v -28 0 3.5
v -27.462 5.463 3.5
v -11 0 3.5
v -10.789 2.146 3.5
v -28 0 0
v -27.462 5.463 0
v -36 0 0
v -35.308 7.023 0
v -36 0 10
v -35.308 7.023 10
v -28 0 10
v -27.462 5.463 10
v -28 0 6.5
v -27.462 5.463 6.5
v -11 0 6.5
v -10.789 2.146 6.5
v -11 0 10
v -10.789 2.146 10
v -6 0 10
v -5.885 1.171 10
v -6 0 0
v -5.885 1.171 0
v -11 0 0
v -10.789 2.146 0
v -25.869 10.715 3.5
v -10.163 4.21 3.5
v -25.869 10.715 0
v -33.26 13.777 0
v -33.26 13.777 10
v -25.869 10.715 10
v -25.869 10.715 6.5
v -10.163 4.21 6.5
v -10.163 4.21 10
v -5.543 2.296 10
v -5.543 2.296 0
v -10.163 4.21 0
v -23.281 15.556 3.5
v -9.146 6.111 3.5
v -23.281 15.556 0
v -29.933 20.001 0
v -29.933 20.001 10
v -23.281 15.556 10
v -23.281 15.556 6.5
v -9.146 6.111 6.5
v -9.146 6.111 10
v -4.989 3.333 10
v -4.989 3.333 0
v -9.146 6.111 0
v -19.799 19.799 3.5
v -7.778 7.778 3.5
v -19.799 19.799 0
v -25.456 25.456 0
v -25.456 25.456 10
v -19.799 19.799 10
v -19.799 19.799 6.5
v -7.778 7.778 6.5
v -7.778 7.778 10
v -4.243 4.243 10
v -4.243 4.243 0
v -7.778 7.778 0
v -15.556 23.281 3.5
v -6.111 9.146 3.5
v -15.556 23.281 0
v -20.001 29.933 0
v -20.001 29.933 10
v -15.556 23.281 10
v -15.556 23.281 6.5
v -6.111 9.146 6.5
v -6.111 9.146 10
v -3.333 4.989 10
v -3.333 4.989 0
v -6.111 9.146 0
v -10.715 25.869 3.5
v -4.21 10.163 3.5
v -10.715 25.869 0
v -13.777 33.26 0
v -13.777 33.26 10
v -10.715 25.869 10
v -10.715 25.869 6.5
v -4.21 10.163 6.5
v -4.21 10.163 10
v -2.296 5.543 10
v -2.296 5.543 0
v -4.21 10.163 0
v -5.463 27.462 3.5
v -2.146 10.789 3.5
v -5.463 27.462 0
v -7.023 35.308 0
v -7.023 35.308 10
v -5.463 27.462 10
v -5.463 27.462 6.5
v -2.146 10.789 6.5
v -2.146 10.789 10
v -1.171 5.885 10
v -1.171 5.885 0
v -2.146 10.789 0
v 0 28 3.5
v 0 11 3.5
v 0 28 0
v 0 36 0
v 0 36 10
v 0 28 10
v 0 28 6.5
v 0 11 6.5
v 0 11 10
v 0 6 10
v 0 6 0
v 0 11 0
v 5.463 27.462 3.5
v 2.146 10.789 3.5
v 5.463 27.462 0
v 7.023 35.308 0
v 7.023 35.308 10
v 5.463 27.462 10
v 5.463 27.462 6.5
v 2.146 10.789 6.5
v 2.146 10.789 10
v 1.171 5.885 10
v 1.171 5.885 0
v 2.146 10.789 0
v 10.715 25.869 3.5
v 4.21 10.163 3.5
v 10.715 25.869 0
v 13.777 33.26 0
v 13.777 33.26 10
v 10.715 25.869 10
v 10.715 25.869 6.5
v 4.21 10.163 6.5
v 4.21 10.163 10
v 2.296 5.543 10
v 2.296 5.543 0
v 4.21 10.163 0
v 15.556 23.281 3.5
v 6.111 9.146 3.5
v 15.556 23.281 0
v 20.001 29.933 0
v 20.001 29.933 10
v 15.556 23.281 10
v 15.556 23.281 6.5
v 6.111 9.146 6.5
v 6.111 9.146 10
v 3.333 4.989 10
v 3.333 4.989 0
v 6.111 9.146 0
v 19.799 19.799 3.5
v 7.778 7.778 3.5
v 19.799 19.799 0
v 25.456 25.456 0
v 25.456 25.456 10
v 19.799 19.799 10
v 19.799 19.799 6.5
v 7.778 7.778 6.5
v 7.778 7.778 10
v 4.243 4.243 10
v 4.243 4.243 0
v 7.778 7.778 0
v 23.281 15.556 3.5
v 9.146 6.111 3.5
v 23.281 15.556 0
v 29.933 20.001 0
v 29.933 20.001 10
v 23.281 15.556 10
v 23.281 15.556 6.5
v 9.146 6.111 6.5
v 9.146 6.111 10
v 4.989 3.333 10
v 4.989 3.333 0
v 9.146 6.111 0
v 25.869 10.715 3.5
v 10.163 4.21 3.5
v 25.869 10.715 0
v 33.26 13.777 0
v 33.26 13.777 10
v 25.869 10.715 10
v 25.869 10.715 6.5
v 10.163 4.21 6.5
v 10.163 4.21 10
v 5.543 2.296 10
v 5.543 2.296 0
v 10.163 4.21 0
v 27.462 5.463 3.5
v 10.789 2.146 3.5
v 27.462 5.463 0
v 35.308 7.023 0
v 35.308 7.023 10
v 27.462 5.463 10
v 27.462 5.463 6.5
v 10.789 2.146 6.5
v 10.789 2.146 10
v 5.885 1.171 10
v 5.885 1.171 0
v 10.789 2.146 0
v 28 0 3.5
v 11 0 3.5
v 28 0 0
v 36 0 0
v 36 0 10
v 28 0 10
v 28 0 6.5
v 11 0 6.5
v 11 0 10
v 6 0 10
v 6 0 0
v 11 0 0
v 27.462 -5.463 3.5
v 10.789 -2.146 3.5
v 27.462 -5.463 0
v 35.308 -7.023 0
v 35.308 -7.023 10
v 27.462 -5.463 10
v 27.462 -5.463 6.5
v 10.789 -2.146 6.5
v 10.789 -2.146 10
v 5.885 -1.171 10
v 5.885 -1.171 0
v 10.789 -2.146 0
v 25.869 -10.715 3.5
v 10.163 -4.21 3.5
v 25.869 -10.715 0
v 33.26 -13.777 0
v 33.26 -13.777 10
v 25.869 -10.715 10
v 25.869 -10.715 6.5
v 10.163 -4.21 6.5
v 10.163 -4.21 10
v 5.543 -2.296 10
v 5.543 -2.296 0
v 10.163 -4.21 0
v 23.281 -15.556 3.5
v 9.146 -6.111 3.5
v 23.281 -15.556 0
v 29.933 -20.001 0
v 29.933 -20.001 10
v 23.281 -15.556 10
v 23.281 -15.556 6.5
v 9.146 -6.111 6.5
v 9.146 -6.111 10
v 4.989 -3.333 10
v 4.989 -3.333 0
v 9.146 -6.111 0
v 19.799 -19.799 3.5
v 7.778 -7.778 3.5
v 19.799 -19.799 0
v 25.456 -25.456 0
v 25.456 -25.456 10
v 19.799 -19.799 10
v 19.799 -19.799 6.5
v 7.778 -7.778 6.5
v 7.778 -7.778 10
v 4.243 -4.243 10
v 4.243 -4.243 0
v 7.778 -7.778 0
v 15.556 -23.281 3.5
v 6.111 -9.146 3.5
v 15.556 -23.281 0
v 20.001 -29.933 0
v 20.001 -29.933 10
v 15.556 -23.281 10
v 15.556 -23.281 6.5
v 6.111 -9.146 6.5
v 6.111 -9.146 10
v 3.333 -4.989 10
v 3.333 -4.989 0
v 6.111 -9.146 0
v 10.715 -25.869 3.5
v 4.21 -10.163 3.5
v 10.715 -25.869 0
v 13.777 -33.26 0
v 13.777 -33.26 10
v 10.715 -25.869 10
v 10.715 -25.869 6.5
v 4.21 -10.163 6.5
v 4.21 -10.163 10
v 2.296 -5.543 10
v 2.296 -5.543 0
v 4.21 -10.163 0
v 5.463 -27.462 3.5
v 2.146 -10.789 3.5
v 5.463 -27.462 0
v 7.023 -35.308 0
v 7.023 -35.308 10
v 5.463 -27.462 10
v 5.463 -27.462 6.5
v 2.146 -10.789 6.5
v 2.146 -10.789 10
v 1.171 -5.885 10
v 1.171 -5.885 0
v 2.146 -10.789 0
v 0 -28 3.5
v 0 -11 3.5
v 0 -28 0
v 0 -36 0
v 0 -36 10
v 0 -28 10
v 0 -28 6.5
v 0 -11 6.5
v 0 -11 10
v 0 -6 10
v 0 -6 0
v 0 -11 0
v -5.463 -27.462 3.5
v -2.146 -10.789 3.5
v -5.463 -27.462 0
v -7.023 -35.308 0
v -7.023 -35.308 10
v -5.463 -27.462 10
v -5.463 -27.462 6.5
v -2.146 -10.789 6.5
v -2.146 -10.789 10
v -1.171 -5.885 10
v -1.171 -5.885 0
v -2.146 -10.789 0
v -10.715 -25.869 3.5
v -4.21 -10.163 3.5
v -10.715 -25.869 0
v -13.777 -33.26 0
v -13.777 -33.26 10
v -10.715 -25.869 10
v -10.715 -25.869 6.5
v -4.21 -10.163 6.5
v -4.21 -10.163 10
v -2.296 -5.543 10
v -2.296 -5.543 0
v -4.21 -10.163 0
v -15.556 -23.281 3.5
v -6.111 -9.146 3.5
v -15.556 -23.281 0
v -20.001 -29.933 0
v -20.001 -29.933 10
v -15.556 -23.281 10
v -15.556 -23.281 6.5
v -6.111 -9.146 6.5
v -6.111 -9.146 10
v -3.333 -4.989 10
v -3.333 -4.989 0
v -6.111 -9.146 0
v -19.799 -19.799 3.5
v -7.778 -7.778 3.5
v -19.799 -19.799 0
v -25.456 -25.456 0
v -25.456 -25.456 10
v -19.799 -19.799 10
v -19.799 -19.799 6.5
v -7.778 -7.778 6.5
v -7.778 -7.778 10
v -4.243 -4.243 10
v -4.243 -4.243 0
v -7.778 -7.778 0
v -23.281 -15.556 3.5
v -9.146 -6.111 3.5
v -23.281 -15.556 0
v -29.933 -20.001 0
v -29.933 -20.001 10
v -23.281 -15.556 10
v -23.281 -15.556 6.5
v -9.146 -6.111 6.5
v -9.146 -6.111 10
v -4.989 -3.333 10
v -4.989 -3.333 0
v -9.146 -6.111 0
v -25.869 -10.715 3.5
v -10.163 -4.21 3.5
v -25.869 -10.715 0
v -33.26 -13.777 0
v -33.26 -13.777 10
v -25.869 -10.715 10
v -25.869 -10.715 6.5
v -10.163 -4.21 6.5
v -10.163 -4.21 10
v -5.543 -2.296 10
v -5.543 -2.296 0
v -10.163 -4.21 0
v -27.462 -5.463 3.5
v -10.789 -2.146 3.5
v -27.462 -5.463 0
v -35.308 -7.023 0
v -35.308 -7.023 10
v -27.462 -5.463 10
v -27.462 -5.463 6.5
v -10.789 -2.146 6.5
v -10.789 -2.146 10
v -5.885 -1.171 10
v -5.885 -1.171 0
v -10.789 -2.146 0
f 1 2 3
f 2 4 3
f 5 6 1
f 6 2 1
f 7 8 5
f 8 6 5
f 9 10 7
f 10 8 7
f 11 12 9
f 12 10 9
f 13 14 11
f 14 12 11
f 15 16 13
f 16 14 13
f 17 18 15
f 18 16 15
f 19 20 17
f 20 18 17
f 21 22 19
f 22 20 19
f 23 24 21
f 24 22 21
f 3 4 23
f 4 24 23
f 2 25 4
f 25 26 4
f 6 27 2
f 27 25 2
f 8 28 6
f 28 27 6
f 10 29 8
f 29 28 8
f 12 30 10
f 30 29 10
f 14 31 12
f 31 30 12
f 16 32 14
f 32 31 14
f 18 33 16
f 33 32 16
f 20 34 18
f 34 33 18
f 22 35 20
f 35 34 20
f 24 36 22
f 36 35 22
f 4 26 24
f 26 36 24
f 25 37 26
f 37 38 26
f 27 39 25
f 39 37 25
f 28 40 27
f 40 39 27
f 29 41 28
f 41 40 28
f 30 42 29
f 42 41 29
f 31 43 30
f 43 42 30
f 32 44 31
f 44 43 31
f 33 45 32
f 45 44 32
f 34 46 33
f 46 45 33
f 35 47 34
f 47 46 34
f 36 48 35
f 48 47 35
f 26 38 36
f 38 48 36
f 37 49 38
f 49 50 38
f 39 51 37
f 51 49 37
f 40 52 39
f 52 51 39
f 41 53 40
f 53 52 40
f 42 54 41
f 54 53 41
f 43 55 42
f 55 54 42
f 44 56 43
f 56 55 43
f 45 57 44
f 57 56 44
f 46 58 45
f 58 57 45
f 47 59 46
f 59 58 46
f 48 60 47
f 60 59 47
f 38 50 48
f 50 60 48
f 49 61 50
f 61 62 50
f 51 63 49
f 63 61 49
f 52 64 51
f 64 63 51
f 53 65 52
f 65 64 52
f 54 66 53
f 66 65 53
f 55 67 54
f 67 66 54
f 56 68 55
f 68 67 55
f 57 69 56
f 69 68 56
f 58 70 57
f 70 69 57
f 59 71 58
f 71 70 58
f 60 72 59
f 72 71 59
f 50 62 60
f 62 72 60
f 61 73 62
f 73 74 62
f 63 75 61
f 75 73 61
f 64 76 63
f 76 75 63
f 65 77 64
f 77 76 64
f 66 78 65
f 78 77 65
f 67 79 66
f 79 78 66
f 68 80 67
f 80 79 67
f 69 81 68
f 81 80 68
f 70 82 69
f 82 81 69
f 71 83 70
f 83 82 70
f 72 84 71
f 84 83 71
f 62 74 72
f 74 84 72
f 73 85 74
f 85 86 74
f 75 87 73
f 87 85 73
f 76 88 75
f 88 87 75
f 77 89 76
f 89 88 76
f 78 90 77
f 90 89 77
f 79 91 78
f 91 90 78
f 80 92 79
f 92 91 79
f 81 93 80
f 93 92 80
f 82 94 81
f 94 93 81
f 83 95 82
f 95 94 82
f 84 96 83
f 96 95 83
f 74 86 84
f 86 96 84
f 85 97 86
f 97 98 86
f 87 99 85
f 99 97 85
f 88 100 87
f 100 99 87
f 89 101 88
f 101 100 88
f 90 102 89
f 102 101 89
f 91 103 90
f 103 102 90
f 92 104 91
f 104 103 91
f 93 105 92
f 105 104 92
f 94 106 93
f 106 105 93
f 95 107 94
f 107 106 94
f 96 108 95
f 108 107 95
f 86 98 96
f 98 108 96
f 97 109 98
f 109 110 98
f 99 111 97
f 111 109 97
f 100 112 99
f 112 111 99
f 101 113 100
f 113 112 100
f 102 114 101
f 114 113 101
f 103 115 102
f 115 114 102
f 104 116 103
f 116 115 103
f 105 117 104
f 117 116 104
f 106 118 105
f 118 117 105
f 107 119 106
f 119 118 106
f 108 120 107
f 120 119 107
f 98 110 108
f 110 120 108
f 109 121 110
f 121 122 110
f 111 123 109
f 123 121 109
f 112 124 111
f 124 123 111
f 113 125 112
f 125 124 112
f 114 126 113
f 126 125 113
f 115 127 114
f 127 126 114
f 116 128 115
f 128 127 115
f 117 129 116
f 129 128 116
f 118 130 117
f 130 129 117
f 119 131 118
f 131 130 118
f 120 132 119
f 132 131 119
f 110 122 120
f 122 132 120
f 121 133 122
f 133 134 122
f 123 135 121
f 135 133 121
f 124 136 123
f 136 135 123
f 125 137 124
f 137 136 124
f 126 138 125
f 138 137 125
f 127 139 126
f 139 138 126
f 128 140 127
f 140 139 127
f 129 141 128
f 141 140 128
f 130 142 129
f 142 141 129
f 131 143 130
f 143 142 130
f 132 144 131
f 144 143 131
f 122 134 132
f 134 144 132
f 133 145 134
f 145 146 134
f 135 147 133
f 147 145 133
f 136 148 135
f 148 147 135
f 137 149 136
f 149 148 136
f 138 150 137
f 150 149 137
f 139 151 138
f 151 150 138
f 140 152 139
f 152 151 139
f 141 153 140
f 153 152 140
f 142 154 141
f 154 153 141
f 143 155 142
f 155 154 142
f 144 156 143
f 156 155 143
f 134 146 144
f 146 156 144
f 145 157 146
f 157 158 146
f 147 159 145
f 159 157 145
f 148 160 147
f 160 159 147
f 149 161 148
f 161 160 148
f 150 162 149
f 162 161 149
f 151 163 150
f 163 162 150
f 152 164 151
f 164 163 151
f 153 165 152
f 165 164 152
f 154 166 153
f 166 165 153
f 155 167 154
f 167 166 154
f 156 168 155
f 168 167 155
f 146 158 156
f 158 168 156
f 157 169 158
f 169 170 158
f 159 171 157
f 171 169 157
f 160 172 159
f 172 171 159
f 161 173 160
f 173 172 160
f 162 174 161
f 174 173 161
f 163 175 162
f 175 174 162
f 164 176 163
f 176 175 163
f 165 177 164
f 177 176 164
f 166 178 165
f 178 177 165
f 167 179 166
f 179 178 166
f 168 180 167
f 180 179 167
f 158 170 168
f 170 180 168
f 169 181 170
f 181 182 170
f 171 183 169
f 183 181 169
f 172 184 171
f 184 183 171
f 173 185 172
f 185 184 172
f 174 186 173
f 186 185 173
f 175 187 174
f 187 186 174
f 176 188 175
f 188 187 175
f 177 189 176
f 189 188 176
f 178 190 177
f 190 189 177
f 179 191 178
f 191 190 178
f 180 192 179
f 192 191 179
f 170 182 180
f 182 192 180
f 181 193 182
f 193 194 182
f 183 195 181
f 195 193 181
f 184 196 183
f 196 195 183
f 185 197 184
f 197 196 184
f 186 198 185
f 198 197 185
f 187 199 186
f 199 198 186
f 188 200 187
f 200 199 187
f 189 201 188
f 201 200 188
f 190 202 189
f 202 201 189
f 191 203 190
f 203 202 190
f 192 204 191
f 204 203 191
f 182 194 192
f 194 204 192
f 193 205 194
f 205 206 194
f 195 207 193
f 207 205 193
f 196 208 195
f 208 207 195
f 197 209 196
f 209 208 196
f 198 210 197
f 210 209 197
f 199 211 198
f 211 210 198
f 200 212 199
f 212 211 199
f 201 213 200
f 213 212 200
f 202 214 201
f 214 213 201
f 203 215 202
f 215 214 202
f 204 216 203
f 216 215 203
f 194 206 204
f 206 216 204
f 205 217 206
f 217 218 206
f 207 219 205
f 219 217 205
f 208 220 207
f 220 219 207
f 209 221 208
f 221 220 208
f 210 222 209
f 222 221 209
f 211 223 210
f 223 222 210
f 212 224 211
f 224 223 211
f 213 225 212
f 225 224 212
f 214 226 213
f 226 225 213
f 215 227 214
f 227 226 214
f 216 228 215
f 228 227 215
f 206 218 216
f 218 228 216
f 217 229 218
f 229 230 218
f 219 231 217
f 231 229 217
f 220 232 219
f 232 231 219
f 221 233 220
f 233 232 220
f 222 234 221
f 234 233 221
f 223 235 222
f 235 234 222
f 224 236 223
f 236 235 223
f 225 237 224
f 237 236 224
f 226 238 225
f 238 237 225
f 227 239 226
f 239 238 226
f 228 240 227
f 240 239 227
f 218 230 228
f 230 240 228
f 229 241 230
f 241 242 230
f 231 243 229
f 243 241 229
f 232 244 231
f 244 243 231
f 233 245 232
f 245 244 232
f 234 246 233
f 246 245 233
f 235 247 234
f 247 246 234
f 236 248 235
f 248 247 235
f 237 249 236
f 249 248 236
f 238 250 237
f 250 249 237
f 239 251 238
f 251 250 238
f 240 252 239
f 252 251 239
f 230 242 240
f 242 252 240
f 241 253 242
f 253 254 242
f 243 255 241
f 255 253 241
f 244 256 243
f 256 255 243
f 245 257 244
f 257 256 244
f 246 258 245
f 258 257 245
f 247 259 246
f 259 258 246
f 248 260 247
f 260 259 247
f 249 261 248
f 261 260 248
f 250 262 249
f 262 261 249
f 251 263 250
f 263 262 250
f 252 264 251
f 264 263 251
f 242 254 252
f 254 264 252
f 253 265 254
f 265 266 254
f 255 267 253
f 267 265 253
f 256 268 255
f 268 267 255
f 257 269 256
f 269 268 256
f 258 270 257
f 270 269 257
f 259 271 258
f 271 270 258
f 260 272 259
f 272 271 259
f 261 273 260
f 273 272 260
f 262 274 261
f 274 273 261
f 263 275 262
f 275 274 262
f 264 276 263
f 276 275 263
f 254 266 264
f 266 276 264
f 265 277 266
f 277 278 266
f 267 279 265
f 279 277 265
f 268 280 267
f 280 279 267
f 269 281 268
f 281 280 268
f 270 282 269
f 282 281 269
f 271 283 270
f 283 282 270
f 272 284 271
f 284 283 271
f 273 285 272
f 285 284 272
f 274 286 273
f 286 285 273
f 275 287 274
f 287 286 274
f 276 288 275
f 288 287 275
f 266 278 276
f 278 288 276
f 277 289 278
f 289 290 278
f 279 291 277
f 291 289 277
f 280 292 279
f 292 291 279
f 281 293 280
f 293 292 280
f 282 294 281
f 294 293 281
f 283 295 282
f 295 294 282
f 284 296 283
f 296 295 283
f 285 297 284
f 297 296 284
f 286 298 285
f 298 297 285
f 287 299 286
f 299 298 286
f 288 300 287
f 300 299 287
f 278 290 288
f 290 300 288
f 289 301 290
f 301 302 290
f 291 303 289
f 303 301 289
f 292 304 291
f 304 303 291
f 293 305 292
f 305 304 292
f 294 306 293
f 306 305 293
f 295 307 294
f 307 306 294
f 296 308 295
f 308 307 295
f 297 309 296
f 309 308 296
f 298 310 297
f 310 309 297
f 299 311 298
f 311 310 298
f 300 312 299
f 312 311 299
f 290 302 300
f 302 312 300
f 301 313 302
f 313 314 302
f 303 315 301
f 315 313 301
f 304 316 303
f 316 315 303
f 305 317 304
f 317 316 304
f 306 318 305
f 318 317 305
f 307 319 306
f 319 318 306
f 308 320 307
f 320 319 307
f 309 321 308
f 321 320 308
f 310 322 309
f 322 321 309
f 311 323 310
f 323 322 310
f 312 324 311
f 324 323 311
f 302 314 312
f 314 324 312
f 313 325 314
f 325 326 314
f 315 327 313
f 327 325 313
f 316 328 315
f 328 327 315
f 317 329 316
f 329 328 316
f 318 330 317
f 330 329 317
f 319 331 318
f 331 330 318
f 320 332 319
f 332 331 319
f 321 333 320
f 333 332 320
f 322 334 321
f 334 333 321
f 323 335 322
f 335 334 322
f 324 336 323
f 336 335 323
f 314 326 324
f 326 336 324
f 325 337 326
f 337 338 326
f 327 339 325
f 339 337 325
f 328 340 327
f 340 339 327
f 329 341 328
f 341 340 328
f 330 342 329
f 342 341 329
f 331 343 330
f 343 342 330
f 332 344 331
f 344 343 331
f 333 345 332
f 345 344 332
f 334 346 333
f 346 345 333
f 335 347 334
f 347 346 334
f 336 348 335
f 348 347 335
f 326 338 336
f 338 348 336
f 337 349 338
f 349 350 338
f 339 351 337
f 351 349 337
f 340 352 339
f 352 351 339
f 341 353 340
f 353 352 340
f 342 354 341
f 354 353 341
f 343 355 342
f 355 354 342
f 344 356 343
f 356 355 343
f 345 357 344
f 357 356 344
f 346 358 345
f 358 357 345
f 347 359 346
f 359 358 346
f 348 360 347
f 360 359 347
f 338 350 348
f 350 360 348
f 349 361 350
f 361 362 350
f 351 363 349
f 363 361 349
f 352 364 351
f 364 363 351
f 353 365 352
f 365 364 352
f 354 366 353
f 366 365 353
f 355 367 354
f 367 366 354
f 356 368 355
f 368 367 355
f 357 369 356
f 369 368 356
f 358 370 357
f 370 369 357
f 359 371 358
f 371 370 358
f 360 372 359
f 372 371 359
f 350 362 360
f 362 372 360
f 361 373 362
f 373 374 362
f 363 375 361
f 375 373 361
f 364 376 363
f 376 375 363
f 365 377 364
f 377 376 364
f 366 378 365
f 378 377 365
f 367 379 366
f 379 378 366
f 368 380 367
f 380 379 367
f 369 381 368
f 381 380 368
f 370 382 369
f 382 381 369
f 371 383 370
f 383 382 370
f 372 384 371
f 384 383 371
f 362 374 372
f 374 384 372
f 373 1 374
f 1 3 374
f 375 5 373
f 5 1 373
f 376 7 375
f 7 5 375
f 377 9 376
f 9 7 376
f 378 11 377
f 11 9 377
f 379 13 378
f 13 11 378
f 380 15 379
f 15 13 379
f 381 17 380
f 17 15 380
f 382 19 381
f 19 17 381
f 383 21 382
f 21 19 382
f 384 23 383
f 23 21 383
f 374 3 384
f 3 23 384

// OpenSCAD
$fn = 32;

// ----------------------------------------------------------------------
// Revolved part: handwheel R36
// ----------------------------------------------------------------------

// --- parameters (mm) ---
bore_r = 6;               // bore radius
rim_r = 36;               // rim radius
rim_w = 8;                // rim axial width
rim_t = 10;               // rim diameter height
hub_r = 11;               // hub radius
web_t = 3;                // web thickness
revolve_angle = 360;      // revolve sweep, degrees
fit_tol = 0.02;           // declared fit tolerance (prompt contract)
free_tol = 0.2;           // declared free tolerance (prompt contract)

bore_d = 2 * bore_r;
rim_d = 2 * rim_r;
hub_d = 2 * hub_r;

profile = [[6, 0], [11, 0], [11, 3.5], [28, 3.5], [28, 0], [36, 0], [36, 10], [28, 10], [28, 6.5], [11, 6.5], [11, 10], [6, 10]];  // primary outline, 12 points, counter clockwise

// --- the one profile operation ---
rotate_extrude(angle = revolve_angle) polygon(points = profile);
